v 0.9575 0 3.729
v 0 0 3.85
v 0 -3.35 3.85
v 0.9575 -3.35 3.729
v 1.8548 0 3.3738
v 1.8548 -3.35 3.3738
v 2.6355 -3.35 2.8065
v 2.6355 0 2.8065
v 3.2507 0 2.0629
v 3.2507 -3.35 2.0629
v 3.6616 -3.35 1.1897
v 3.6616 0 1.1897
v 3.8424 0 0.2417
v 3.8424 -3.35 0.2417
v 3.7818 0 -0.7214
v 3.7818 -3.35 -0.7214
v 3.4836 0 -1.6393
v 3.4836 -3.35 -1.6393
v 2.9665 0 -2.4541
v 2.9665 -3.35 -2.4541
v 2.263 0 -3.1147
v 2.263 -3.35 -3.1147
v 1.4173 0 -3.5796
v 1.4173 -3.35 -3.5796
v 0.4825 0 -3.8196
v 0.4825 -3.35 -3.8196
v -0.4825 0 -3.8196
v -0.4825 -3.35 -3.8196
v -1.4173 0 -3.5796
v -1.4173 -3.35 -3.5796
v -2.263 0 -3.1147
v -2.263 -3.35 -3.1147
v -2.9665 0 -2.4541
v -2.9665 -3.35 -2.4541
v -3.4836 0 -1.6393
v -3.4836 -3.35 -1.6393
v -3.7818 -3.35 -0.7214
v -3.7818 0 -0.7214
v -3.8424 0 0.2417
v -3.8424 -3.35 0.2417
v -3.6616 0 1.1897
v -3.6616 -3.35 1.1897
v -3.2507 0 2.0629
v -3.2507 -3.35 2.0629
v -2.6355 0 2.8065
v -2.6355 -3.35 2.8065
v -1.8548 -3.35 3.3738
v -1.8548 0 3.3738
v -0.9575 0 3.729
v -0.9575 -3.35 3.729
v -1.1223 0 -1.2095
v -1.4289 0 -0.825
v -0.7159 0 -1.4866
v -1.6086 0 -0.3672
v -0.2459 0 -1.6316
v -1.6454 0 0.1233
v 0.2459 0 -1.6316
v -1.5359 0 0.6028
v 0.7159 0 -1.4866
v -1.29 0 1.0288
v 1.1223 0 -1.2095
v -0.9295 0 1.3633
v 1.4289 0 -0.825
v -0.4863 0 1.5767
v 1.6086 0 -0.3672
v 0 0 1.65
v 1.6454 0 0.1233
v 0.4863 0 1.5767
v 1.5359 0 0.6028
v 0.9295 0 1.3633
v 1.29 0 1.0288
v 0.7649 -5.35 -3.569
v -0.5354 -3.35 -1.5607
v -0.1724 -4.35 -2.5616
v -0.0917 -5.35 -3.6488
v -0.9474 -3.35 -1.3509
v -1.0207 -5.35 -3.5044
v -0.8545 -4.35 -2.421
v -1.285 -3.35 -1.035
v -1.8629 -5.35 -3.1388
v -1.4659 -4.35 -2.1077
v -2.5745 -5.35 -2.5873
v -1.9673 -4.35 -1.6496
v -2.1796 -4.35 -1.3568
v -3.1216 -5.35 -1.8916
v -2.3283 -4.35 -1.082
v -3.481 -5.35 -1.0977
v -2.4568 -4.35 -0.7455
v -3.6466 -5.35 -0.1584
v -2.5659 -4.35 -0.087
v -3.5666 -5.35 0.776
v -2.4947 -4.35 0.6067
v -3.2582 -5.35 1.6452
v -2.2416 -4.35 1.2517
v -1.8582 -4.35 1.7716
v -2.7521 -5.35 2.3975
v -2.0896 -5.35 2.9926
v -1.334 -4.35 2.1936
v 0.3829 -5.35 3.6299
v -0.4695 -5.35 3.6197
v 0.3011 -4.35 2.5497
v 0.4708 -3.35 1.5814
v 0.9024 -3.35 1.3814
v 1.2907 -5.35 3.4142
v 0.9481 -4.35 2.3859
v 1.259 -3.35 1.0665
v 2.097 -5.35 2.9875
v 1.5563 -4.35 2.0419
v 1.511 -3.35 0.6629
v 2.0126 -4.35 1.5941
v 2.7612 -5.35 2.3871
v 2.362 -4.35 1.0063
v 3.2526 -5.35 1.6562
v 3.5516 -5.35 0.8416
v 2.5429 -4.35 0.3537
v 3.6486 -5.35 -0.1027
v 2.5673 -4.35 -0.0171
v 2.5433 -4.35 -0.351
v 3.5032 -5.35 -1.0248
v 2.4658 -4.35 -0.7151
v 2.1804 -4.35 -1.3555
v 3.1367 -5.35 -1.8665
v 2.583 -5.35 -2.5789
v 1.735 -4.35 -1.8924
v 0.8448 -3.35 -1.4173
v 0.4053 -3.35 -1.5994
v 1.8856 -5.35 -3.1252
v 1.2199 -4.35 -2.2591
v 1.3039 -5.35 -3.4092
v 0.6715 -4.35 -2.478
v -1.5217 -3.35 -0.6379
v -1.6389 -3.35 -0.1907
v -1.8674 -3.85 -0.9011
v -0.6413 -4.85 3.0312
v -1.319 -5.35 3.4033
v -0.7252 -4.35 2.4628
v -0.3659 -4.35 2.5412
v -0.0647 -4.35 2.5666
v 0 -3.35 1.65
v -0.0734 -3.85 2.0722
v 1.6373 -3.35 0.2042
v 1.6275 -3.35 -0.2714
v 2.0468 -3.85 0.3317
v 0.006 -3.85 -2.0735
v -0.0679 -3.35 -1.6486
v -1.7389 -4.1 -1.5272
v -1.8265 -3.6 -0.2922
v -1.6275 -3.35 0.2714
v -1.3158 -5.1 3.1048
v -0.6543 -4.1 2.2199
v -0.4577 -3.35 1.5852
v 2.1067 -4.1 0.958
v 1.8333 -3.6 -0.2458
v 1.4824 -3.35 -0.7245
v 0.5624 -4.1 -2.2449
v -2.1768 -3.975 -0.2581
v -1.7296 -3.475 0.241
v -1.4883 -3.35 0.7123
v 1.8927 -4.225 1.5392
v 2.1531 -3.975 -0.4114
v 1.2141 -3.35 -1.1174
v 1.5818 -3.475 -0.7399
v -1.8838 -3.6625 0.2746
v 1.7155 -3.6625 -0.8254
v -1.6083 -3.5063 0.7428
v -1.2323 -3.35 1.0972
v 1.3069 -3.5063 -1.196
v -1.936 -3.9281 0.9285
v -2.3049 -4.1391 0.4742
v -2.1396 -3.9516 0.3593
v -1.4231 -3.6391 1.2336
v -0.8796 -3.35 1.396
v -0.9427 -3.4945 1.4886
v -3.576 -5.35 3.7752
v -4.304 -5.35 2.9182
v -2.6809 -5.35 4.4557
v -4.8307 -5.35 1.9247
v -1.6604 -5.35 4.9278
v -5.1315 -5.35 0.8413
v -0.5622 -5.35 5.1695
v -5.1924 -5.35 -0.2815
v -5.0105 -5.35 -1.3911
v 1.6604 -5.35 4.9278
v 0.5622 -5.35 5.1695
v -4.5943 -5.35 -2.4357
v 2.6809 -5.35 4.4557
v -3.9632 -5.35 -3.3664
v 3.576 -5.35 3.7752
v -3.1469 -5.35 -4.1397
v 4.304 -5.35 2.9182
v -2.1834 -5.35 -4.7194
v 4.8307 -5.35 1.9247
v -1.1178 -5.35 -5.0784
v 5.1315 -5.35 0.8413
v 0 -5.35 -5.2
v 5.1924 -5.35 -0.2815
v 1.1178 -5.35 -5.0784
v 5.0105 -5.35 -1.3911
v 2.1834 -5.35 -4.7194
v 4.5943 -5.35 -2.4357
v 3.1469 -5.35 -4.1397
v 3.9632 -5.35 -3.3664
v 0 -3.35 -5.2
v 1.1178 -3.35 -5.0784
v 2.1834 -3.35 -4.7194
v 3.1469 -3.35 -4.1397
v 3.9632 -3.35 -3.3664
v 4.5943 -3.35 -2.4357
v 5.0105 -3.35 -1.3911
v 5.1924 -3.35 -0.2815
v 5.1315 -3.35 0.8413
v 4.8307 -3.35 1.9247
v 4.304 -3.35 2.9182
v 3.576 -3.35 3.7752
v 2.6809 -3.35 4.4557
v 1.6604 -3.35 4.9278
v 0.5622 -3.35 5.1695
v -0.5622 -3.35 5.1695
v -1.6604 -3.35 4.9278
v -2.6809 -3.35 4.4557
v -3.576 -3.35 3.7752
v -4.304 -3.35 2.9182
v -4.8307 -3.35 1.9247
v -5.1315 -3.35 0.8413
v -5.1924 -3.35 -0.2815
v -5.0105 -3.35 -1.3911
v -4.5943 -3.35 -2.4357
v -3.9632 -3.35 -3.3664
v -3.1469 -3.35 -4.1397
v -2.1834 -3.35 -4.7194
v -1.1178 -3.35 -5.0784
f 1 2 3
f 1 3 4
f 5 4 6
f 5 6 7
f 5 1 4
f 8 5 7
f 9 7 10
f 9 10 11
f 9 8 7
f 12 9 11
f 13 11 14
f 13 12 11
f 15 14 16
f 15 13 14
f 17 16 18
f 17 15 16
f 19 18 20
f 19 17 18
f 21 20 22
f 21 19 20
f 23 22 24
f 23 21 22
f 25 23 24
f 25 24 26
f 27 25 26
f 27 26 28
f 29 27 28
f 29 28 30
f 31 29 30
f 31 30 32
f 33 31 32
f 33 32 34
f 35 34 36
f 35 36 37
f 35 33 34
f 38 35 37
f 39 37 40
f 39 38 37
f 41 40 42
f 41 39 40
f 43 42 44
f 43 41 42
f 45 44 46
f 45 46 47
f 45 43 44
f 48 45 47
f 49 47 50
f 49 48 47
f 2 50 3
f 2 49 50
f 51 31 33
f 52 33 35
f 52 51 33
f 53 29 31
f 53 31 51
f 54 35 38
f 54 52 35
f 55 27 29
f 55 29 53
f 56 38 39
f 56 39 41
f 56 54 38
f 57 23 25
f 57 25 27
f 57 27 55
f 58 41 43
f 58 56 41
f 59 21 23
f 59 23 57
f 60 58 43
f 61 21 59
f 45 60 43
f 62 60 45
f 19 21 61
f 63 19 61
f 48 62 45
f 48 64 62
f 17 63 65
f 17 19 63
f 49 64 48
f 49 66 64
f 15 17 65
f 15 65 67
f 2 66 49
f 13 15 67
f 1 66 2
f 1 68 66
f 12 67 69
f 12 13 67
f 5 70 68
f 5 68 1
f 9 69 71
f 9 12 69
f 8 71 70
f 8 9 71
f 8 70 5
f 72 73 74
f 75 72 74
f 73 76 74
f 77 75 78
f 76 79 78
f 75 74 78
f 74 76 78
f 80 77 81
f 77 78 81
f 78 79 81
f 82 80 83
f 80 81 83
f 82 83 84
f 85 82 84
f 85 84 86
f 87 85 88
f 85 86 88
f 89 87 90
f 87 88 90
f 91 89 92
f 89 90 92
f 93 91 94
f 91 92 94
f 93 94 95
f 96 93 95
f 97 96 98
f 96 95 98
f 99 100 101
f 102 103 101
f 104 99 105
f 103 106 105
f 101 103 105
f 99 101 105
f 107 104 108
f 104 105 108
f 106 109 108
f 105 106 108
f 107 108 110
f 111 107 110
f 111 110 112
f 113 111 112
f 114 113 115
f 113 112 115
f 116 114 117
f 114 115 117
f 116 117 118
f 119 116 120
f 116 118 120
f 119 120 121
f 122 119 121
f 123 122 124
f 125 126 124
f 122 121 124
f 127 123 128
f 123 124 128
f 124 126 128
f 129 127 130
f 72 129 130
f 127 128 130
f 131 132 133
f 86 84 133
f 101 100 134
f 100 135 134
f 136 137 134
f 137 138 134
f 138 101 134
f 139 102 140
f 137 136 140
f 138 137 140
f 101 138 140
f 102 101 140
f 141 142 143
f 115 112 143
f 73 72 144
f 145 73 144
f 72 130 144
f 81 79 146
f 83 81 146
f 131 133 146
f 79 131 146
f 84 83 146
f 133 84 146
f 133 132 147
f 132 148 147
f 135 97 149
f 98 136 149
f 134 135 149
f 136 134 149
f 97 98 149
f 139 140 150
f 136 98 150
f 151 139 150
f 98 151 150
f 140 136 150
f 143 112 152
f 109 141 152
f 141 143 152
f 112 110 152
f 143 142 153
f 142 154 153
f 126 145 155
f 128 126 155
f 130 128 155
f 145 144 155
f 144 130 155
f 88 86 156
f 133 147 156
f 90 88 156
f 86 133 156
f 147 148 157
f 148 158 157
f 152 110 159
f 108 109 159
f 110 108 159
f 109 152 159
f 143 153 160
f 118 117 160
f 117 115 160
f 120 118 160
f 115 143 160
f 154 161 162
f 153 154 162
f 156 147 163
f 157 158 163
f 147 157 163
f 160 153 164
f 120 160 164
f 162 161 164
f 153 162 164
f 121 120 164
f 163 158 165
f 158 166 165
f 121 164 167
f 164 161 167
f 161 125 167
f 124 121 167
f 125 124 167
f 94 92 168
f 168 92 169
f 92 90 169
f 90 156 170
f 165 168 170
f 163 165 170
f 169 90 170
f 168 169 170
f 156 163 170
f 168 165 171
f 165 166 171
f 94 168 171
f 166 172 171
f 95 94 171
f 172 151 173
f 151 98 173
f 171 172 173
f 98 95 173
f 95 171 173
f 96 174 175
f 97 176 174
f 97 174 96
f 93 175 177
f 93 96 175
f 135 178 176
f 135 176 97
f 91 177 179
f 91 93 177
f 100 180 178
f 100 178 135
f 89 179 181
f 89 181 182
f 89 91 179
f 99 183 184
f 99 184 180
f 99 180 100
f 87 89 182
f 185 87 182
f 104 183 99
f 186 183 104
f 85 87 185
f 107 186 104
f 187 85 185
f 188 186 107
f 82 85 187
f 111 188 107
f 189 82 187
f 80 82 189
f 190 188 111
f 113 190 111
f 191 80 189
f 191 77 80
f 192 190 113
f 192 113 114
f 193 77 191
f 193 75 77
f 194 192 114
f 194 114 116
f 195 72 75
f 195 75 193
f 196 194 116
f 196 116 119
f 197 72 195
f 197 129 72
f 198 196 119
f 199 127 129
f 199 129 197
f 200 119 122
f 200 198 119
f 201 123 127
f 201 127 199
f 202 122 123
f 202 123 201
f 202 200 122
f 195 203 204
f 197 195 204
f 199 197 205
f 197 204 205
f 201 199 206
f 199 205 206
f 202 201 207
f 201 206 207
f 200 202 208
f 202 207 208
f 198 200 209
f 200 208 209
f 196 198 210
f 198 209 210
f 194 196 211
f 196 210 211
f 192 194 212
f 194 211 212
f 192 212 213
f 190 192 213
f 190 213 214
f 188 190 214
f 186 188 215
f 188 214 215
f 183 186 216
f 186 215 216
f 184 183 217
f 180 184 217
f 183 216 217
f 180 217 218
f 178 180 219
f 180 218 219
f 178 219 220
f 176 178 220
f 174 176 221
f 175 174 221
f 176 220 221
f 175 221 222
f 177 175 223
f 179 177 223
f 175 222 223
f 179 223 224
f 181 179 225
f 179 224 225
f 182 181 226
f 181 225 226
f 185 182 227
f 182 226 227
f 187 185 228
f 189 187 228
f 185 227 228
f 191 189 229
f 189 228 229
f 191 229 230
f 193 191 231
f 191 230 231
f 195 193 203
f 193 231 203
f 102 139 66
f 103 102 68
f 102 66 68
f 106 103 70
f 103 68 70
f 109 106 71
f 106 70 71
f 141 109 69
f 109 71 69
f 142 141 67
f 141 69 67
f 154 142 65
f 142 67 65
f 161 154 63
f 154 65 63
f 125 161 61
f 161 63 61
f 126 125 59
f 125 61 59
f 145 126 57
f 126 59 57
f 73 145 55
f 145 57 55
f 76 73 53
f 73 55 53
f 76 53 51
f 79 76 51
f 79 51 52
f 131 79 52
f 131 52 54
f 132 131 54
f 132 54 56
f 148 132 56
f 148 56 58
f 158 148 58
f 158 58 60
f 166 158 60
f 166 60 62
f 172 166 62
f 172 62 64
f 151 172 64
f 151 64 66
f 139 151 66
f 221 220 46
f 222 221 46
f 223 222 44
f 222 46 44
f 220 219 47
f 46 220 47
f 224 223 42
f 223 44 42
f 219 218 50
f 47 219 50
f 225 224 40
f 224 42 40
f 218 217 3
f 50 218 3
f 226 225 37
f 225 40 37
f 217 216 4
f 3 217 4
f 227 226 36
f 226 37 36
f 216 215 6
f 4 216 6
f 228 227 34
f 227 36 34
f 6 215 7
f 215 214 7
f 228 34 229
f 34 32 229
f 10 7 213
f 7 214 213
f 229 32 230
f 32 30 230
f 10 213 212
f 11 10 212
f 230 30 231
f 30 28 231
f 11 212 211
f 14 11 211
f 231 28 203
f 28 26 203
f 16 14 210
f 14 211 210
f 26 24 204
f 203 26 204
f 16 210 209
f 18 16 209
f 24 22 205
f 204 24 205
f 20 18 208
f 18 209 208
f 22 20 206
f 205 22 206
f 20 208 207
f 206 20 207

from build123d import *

# Parameters (mm, degrees)
SKETCH_2_R      = 3.85
SKETCH_2_R_2    = 1.65
EXTRUDE_8_DEPTH = 3.35
SKETCH_3_R      = 5.2
EXTRUDE_9_DEPTH = 2


with BuildPart() as part:
    # 草图2 → 凸台-拉伸8 (new body)
    with BuildSketch(Plane(origin=(0, 0, 0), x_dir=(1, 0, 0), z_dir=(0, 1, 0))):
        with Locations(Location((0, 0, 0), (0, 0, 270))):
            Circle(SKETCH_2_R)
        with Locations(Location((0, 0, 0), (0, 0, 270))):
            Circle(SKETCH_2_R_2, mode=Mode.SUBTRACT)
    extrude(amount=-EXTRUDE_8_DEPTH)

    # 草图3 → 凸台-拉伸9 (add)
    with BuildSketch(Plane(origin=(0, -3.35, 0), x_dir=(-1, 0, 0), z_dir=(0, -1, 0))):
        with Locations(Location((0, 0, 0), (0, 0, 90))):
            Circle(SKETCH_3_R)
    extrude(amount=EXTRUDE_9_DEPTH)

    # 切除-放样1: read off the stored shape, not the designer's step
    # 切除-放样1: loft between two sections, ruled curve by curve
    loft_1_from = [
        Edge.make_bspline([(0.764858596, -5.35, -3.56896222), (-6.373065844, -5.35, -5.098679412), (-7.902783036, -5.35, 2.039245028), (-0.764858596, -5.35, 3.56896222), (6.373065844, -5.35, 5.098679412), (7.902783036, -5.35, -2.039245028), (0.764858596, -5.35, -3.56896222)], [0, 0, 0, 0, 0.5, 0.5, 0.5, 1, 1, 1, 1], 3, [1, 0.333333333, 0.333333333, 1, 0.333333333, 0.333333333, 1]),
    ]
    loft_1_to = [
        Edge.make_bspline([(-0.535444465, -3.35, -1.56070472), (-3.656853906, -3.35, -0.48981579), (-2.585964976, -3.35, 2.631593651), (0.535444465, -3.35, 1.56070472), (3.656853906, -3.35, 0.48981579), (2.585964976, -3.35, -2.631593651), (-0.535444465, -3.35, -1.56070472)], [0, 0, 0, 0, 0.5, 0.5, 0.5, 1, 1, 1, 1], 3, [1, 0.333333333, 0.333333333, 1, 0.333333333, 0.333333333, 1]),
    ]
    loft_1 = Solid(Shell([*[Face.make_surface_from_curves(loft_1_from[k], loft_1_to[k]) for k in range(1)], Face(Wire(loft_1_from)), Face(Wire(loft_1_to))]))
    add(loft_1, mode=Mode.SUBTRACT)


solid = part.part
